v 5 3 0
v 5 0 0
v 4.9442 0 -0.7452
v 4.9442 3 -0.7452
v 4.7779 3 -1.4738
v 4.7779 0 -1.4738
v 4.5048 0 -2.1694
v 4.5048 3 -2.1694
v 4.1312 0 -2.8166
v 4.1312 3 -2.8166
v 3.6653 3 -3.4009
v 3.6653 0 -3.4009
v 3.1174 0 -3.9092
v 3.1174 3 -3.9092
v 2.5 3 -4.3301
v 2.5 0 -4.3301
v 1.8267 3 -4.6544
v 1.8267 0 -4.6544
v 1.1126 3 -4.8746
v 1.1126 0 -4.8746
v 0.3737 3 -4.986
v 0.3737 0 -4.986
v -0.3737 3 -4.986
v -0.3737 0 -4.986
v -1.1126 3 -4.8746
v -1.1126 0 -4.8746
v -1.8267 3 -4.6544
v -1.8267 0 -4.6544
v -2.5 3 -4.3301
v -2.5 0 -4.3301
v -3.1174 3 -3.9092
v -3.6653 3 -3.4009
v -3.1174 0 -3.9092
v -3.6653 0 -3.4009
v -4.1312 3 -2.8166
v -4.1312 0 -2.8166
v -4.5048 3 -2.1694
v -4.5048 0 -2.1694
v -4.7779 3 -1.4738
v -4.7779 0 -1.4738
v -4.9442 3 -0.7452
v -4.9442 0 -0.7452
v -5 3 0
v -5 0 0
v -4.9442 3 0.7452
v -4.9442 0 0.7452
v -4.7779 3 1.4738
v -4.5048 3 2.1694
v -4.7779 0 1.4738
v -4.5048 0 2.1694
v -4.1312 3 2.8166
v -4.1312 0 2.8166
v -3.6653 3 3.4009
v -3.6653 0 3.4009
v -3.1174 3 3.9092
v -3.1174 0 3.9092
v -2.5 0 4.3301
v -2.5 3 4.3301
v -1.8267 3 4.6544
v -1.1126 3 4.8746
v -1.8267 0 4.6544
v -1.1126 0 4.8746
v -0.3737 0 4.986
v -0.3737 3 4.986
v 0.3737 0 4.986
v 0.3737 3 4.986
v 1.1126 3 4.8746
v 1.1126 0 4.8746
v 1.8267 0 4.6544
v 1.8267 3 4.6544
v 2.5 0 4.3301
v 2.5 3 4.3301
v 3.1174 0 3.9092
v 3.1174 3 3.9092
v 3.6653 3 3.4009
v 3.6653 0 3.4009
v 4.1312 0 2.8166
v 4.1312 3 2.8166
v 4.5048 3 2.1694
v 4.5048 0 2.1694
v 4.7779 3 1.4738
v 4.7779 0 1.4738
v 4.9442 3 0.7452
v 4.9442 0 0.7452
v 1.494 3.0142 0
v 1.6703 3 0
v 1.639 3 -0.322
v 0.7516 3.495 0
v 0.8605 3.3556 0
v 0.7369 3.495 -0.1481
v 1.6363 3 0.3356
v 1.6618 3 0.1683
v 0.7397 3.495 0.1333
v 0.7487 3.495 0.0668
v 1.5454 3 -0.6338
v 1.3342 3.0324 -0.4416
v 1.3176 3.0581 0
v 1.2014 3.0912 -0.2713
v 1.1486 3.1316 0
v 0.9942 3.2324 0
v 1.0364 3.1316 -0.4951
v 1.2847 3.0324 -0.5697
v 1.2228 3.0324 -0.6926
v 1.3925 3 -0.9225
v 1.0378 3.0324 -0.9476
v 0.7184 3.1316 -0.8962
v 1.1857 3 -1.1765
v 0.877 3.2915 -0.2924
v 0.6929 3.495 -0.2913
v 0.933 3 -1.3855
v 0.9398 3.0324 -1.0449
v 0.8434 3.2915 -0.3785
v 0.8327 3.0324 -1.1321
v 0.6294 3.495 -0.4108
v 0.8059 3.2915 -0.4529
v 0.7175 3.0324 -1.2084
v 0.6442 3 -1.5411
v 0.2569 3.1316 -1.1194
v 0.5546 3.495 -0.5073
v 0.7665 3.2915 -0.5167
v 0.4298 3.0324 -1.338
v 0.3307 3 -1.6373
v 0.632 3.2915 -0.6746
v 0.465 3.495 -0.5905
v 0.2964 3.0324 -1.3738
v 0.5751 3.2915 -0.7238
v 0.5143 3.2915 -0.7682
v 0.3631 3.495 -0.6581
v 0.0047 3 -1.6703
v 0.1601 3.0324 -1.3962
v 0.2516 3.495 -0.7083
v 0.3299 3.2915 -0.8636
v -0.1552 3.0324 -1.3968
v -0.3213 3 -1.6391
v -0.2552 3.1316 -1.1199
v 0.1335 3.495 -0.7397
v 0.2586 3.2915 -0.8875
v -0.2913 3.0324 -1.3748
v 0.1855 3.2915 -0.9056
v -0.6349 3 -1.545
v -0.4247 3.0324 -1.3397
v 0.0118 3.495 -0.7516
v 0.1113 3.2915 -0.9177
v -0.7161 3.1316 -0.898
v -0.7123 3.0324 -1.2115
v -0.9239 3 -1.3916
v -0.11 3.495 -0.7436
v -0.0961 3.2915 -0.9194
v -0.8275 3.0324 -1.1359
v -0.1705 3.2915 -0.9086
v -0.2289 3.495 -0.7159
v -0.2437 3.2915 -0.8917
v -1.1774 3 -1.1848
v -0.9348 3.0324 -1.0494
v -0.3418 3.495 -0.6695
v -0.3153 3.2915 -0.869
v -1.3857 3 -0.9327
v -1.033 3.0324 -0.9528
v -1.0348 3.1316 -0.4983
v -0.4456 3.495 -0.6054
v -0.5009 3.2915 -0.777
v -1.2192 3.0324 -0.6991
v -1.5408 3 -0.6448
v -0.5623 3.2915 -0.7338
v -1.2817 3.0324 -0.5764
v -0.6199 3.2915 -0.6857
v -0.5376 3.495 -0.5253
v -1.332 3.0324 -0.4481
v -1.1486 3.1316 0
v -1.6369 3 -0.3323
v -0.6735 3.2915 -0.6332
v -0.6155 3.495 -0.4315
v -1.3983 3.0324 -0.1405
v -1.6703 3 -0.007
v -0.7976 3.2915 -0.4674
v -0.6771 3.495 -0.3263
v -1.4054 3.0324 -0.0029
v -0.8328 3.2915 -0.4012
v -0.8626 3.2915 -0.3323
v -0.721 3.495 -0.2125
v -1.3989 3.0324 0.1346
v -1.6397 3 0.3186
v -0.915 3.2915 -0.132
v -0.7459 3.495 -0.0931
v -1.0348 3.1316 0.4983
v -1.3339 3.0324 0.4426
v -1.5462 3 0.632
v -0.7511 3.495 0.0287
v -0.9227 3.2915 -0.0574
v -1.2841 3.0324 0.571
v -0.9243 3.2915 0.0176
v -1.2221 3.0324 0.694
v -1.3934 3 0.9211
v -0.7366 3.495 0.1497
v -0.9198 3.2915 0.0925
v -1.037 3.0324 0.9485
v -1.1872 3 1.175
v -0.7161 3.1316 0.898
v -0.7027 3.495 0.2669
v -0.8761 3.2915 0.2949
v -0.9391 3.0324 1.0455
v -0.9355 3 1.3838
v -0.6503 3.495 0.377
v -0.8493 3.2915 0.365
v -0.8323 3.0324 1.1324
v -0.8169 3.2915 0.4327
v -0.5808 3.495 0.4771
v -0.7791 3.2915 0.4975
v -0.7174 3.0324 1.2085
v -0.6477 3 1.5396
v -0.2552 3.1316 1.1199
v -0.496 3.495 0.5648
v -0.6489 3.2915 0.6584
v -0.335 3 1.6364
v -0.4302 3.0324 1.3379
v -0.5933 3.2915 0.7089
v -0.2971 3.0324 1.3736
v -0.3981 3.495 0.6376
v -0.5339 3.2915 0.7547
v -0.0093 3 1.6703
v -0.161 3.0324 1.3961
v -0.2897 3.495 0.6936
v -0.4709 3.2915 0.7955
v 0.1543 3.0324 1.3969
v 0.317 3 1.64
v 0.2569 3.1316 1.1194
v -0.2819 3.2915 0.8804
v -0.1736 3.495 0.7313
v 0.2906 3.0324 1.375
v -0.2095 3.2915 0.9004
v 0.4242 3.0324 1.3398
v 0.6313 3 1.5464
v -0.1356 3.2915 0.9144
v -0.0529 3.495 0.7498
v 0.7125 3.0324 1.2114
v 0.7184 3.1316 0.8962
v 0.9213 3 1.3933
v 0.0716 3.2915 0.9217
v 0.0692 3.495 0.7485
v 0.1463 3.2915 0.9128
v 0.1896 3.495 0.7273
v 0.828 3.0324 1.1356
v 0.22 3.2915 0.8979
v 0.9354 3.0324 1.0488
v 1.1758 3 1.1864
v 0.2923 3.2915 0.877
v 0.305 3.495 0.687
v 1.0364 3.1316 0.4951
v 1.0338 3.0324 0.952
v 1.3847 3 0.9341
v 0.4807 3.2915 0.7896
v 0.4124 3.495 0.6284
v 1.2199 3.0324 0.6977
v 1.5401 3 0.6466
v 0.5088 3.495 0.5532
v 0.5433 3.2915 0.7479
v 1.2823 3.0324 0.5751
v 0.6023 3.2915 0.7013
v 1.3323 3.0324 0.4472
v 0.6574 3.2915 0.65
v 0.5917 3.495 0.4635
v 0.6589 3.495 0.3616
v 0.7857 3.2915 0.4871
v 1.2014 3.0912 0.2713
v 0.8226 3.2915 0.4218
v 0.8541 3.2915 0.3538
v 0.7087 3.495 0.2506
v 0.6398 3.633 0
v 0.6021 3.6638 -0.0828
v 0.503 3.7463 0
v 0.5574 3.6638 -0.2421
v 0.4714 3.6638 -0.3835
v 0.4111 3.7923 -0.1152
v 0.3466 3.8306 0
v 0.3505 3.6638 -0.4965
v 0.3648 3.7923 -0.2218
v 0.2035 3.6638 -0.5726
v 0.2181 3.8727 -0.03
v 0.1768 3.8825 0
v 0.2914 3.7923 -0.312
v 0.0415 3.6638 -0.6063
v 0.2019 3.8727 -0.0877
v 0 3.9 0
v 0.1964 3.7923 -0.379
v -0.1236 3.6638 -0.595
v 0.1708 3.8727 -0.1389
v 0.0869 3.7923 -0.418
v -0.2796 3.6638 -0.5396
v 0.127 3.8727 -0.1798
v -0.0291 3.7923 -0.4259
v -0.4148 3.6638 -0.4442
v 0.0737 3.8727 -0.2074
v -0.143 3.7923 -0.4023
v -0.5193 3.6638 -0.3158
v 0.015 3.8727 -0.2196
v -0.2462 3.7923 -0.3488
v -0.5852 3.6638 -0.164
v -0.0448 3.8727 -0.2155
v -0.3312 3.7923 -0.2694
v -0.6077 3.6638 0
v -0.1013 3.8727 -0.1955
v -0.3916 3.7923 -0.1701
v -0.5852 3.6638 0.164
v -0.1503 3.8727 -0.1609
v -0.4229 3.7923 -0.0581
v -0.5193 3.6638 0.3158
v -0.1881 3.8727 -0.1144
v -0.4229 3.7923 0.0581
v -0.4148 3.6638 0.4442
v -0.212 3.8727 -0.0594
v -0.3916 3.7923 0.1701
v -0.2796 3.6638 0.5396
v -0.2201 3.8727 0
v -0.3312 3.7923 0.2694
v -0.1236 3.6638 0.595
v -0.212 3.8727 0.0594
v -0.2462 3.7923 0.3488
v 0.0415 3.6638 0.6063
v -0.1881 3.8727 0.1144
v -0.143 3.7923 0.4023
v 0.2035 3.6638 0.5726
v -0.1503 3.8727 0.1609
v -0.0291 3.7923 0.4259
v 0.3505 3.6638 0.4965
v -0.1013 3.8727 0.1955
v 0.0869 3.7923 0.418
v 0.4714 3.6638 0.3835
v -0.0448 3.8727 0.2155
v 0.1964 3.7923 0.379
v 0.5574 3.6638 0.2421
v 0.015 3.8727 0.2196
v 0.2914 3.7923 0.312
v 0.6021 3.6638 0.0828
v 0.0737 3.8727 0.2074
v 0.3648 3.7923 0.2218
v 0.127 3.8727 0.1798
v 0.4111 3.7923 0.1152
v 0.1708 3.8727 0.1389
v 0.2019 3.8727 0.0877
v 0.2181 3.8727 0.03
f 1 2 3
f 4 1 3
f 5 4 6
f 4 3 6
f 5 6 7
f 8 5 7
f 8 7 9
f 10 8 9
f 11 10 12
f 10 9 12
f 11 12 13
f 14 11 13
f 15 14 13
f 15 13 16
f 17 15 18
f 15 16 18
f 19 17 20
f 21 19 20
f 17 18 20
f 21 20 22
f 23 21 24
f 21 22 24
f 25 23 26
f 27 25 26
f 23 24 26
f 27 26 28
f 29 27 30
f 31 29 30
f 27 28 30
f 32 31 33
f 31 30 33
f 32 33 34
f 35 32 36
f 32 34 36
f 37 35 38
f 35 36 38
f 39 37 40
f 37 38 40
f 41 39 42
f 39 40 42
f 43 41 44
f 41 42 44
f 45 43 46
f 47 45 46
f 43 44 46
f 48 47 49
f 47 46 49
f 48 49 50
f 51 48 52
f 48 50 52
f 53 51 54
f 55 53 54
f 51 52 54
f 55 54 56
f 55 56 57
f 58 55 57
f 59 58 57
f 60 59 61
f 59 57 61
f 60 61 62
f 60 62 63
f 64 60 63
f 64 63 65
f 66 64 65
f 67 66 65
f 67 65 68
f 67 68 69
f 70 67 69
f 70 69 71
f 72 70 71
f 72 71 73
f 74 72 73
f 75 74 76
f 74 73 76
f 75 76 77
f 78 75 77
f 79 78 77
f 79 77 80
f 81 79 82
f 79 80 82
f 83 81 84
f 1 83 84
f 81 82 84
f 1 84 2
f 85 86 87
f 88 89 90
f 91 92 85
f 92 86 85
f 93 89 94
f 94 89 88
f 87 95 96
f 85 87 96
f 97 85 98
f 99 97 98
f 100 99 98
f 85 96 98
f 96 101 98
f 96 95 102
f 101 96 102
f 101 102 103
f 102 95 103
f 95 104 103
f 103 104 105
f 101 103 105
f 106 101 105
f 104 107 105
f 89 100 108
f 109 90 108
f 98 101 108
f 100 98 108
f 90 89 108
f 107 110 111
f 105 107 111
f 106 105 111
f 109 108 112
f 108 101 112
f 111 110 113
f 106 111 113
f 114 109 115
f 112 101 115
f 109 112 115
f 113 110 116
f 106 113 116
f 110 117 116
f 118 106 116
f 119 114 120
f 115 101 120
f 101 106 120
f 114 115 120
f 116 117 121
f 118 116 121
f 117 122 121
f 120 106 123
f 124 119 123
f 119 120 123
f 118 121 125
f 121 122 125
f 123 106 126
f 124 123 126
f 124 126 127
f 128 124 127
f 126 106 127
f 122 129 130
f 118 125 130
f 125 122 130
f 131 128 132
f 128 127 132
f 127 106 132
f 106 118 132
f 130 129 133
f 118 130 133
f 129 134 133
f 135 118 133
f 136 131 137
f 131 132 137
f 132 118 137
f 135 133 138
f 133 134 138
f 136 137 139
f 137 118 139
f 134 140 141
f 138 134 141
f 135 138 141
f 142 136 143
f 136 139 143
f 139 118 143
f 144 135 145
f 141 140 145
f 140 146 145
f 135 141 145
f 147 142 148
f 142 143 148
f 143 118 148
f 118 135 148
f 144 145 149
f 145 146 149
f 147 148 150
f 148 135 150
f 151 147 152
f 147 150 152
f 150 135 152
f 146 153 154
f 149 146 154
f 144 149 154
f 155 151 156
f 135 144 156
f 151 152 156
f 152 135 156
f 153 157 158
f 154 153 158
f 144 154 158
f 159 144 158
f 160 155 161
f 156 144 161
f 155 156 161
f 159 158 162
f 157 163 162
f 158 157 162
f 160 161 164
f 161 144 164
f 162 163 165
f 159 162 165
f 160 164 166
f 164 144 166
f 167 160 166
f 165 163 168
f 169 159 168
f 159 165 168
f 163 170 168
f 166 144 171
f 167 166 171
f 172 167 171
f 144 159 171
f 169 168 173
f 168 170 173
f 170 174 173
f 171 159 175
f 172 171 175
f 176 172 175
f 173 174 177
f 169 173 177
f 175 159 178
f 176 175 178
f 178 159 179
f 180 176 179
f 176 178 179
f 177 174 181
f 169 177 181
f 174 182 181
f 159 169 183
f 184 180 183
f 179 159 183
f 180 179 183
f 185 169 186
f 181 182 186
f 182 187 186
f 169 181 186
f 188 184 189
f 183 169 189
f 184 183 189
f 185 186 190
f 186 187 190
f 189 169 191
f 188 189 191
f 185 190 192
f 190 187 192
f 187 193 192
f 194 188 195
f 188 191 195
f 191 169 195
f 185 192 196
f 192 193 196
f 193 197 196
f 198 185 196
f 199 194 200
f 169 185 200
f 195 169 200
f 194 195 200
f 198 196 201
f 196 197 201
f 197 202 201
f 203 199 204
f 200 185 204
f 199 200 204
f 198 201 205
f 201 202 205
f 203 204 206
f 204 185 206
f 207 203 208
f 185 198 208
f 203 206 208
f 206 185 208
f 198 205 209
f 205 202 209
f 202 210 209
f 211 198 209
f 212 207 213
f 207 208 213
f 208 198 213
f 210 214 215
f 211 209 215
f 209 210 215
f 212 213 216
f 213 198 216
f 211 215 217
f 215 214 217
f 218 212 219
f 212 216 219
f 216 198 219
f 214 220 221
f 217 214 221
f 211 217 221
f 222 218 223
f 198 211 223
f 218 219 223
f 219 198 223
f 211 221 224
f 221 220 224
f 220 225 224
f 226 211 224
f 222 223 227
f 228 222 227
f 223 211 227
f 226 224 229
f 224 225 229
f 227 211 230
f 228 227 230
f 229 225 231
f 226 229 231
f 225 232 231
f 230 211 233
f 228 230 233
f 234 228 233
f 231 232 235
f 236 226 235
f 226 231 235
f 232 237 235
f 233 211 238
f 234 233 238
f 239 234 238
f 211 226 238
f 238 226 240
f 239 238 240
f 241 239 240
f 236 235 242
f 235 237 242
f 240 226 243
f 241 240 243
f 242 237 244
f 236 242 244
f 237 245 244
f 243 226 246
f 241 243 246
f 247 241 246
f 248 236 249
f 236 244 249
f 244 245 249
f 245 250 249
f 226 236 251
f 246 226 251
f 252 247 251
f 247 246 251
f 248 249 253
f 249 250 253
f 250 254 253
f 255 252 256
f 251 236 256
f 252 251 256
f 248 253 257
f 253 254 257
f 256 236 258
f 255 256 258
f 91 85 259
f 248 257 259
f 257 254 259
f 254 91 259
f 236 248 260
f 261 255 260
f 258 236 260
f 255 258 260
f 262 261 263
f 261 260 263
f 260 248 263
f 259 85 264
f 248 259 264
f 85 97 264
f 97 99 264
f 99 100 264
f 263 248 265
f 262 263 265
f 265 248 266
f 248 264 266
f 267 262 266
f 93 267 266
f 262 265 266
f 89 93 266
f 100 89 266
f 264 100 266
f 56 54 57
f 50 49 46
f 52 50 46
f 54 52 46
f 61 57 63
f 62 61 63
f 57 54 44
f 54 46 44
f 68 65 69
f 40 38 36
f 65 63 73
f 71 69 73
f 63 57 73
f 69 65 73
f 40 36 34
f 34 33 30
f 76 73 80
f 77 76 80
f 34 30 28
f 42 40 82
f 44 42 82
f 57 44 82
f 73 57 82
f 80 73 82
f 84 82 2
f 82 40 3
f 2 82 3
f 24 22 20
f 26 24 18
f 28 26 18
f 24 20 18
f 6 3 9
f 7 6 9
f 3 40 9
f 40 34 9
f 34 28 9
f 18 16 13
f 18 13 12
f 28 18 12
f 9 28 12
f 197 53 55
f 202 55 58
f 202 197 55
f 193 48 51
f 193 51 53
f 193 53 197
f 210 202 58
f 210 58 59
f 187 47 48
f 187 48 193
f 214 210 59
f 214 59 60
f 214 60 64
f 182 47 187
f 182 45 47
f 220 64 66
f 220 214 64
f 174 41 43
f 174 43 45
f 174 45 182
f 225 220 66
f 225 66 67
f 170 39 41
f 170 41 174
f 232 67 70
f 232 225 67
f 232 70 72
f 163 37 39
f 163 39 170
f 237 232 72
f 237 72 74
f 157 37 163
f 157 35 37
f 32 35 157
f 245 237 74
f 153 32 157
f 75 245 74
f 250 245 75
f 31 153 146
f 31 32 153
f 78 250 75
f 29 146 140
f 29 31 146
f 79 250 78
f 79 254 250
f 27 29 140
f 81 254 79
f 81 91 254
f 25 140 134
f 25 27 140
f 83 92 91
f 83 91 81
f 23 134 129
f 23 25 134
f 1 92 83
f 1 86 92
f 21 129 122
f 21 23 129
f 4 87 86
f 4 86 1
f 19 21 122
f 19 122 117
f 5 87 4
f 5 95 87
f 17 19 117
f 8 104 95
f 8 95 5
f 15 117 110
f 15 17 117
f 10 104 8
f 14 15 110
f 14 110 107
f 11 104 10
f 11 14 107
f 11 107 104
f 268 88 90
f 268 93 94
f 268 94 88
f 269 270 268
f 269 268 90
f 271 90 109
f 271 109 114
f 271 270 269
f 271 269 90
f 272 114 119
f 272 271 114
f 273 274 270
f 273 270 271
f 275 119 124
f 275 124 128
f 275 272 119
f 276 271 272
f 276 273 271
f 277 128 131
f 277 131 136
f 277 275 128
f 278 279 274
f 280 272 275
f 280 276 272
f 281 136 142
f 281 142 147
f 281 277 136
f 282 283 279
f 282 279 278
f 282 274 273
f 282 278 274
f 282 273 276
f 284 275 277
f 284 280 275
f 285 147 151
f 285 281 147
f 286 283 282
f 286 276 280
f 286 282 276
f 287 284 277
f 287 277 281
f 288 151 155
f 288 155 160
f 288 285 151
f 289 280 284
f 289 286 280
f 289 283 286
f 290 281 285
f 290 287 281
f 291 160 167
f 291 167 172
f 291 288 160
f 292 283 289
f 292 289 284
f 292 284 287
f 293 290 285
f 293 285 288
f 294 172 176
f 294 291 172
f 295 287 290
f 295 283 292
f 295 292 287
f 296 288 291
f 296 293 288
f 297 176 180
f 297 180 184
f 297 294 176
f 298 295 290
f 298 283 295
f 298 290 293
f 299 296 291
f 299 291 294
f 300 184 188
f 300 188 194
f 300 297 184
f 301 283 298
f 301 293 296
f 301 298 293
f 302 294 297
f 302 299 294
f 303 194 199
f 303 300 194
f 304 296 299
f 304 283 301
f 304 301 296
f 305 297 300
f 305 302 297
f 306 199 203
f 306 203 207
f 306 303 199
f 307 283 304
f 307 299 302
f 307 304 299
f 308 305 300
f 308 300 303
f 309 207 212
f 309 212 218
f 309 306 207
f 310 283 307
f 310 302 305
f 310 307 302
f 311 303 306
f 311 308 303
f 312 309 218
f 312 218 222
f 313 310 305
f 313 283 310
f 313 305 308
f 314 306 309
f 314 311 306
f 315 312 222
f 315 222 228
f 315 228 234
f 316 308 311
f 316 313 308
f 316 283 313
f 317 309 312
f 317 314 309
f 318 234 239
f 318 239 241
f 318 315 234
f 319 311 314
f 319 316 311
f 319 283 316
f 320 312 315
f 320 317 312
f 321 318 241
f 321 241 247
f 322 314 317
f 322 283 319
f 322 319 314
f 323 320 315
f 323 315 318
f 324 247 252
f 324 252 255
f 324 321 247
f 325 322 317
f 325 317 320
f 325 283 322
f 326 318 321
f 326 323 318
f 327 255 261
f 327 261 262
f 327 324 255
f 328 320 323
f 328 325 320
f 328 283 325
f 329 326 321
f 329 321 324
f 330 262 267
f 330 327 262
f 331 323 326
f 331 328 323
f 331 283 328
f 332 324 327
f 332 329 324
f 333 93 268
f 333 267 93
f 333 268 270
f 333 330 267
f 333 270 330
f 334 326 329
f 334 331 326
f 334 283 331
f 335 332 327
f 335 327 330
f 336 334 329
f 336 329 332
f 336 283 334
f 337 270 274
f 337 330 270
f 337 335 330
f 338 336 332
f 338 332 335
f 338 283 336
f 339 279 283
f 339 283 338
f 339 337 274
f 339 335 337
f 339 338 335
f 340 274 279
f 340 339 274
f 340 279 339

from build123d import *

# Parameters (mm, degrees)
SKETCH_1_R      = 5
EXTRUDE_1_DEPTH = 3
FILLET_1_R      = 1.1


with BuildPart() as part:
    # 草图1 → 凸台-拉伸1 (new body)
    with BuildSketch(Plane(origin=(0, 0, 0), x_dir=(1, 0, 0), z_dir=(0, 1, 0))):
        Circle(SKETCH_1_R)
    extrude(amount=EXTRUDE_1_DEPTH)

    # 草图2 → 旋转1 (revolve)
    with BuildSketch(Plane.XY):
        with BuildLine():
            Line((0, 3.9), (0, 3))
            Line((0, 3), (0.9, 3))
            ThreePointArc((0.9, 3), (0.636396103, 3.636396103), (0, 3.9))
        make_face()
    revolve(axis=Axis((0, 0, 0), (0, 1, 0)))

    # 圆角1
    fillet_1_edges = [part.edges().sort_by_distance(p)[0] for p in [
        (-0.9, 3, 0),
    ]]
    fillet(fillet_1_edges, radius=FILLET_1_R)


solid = part.part
